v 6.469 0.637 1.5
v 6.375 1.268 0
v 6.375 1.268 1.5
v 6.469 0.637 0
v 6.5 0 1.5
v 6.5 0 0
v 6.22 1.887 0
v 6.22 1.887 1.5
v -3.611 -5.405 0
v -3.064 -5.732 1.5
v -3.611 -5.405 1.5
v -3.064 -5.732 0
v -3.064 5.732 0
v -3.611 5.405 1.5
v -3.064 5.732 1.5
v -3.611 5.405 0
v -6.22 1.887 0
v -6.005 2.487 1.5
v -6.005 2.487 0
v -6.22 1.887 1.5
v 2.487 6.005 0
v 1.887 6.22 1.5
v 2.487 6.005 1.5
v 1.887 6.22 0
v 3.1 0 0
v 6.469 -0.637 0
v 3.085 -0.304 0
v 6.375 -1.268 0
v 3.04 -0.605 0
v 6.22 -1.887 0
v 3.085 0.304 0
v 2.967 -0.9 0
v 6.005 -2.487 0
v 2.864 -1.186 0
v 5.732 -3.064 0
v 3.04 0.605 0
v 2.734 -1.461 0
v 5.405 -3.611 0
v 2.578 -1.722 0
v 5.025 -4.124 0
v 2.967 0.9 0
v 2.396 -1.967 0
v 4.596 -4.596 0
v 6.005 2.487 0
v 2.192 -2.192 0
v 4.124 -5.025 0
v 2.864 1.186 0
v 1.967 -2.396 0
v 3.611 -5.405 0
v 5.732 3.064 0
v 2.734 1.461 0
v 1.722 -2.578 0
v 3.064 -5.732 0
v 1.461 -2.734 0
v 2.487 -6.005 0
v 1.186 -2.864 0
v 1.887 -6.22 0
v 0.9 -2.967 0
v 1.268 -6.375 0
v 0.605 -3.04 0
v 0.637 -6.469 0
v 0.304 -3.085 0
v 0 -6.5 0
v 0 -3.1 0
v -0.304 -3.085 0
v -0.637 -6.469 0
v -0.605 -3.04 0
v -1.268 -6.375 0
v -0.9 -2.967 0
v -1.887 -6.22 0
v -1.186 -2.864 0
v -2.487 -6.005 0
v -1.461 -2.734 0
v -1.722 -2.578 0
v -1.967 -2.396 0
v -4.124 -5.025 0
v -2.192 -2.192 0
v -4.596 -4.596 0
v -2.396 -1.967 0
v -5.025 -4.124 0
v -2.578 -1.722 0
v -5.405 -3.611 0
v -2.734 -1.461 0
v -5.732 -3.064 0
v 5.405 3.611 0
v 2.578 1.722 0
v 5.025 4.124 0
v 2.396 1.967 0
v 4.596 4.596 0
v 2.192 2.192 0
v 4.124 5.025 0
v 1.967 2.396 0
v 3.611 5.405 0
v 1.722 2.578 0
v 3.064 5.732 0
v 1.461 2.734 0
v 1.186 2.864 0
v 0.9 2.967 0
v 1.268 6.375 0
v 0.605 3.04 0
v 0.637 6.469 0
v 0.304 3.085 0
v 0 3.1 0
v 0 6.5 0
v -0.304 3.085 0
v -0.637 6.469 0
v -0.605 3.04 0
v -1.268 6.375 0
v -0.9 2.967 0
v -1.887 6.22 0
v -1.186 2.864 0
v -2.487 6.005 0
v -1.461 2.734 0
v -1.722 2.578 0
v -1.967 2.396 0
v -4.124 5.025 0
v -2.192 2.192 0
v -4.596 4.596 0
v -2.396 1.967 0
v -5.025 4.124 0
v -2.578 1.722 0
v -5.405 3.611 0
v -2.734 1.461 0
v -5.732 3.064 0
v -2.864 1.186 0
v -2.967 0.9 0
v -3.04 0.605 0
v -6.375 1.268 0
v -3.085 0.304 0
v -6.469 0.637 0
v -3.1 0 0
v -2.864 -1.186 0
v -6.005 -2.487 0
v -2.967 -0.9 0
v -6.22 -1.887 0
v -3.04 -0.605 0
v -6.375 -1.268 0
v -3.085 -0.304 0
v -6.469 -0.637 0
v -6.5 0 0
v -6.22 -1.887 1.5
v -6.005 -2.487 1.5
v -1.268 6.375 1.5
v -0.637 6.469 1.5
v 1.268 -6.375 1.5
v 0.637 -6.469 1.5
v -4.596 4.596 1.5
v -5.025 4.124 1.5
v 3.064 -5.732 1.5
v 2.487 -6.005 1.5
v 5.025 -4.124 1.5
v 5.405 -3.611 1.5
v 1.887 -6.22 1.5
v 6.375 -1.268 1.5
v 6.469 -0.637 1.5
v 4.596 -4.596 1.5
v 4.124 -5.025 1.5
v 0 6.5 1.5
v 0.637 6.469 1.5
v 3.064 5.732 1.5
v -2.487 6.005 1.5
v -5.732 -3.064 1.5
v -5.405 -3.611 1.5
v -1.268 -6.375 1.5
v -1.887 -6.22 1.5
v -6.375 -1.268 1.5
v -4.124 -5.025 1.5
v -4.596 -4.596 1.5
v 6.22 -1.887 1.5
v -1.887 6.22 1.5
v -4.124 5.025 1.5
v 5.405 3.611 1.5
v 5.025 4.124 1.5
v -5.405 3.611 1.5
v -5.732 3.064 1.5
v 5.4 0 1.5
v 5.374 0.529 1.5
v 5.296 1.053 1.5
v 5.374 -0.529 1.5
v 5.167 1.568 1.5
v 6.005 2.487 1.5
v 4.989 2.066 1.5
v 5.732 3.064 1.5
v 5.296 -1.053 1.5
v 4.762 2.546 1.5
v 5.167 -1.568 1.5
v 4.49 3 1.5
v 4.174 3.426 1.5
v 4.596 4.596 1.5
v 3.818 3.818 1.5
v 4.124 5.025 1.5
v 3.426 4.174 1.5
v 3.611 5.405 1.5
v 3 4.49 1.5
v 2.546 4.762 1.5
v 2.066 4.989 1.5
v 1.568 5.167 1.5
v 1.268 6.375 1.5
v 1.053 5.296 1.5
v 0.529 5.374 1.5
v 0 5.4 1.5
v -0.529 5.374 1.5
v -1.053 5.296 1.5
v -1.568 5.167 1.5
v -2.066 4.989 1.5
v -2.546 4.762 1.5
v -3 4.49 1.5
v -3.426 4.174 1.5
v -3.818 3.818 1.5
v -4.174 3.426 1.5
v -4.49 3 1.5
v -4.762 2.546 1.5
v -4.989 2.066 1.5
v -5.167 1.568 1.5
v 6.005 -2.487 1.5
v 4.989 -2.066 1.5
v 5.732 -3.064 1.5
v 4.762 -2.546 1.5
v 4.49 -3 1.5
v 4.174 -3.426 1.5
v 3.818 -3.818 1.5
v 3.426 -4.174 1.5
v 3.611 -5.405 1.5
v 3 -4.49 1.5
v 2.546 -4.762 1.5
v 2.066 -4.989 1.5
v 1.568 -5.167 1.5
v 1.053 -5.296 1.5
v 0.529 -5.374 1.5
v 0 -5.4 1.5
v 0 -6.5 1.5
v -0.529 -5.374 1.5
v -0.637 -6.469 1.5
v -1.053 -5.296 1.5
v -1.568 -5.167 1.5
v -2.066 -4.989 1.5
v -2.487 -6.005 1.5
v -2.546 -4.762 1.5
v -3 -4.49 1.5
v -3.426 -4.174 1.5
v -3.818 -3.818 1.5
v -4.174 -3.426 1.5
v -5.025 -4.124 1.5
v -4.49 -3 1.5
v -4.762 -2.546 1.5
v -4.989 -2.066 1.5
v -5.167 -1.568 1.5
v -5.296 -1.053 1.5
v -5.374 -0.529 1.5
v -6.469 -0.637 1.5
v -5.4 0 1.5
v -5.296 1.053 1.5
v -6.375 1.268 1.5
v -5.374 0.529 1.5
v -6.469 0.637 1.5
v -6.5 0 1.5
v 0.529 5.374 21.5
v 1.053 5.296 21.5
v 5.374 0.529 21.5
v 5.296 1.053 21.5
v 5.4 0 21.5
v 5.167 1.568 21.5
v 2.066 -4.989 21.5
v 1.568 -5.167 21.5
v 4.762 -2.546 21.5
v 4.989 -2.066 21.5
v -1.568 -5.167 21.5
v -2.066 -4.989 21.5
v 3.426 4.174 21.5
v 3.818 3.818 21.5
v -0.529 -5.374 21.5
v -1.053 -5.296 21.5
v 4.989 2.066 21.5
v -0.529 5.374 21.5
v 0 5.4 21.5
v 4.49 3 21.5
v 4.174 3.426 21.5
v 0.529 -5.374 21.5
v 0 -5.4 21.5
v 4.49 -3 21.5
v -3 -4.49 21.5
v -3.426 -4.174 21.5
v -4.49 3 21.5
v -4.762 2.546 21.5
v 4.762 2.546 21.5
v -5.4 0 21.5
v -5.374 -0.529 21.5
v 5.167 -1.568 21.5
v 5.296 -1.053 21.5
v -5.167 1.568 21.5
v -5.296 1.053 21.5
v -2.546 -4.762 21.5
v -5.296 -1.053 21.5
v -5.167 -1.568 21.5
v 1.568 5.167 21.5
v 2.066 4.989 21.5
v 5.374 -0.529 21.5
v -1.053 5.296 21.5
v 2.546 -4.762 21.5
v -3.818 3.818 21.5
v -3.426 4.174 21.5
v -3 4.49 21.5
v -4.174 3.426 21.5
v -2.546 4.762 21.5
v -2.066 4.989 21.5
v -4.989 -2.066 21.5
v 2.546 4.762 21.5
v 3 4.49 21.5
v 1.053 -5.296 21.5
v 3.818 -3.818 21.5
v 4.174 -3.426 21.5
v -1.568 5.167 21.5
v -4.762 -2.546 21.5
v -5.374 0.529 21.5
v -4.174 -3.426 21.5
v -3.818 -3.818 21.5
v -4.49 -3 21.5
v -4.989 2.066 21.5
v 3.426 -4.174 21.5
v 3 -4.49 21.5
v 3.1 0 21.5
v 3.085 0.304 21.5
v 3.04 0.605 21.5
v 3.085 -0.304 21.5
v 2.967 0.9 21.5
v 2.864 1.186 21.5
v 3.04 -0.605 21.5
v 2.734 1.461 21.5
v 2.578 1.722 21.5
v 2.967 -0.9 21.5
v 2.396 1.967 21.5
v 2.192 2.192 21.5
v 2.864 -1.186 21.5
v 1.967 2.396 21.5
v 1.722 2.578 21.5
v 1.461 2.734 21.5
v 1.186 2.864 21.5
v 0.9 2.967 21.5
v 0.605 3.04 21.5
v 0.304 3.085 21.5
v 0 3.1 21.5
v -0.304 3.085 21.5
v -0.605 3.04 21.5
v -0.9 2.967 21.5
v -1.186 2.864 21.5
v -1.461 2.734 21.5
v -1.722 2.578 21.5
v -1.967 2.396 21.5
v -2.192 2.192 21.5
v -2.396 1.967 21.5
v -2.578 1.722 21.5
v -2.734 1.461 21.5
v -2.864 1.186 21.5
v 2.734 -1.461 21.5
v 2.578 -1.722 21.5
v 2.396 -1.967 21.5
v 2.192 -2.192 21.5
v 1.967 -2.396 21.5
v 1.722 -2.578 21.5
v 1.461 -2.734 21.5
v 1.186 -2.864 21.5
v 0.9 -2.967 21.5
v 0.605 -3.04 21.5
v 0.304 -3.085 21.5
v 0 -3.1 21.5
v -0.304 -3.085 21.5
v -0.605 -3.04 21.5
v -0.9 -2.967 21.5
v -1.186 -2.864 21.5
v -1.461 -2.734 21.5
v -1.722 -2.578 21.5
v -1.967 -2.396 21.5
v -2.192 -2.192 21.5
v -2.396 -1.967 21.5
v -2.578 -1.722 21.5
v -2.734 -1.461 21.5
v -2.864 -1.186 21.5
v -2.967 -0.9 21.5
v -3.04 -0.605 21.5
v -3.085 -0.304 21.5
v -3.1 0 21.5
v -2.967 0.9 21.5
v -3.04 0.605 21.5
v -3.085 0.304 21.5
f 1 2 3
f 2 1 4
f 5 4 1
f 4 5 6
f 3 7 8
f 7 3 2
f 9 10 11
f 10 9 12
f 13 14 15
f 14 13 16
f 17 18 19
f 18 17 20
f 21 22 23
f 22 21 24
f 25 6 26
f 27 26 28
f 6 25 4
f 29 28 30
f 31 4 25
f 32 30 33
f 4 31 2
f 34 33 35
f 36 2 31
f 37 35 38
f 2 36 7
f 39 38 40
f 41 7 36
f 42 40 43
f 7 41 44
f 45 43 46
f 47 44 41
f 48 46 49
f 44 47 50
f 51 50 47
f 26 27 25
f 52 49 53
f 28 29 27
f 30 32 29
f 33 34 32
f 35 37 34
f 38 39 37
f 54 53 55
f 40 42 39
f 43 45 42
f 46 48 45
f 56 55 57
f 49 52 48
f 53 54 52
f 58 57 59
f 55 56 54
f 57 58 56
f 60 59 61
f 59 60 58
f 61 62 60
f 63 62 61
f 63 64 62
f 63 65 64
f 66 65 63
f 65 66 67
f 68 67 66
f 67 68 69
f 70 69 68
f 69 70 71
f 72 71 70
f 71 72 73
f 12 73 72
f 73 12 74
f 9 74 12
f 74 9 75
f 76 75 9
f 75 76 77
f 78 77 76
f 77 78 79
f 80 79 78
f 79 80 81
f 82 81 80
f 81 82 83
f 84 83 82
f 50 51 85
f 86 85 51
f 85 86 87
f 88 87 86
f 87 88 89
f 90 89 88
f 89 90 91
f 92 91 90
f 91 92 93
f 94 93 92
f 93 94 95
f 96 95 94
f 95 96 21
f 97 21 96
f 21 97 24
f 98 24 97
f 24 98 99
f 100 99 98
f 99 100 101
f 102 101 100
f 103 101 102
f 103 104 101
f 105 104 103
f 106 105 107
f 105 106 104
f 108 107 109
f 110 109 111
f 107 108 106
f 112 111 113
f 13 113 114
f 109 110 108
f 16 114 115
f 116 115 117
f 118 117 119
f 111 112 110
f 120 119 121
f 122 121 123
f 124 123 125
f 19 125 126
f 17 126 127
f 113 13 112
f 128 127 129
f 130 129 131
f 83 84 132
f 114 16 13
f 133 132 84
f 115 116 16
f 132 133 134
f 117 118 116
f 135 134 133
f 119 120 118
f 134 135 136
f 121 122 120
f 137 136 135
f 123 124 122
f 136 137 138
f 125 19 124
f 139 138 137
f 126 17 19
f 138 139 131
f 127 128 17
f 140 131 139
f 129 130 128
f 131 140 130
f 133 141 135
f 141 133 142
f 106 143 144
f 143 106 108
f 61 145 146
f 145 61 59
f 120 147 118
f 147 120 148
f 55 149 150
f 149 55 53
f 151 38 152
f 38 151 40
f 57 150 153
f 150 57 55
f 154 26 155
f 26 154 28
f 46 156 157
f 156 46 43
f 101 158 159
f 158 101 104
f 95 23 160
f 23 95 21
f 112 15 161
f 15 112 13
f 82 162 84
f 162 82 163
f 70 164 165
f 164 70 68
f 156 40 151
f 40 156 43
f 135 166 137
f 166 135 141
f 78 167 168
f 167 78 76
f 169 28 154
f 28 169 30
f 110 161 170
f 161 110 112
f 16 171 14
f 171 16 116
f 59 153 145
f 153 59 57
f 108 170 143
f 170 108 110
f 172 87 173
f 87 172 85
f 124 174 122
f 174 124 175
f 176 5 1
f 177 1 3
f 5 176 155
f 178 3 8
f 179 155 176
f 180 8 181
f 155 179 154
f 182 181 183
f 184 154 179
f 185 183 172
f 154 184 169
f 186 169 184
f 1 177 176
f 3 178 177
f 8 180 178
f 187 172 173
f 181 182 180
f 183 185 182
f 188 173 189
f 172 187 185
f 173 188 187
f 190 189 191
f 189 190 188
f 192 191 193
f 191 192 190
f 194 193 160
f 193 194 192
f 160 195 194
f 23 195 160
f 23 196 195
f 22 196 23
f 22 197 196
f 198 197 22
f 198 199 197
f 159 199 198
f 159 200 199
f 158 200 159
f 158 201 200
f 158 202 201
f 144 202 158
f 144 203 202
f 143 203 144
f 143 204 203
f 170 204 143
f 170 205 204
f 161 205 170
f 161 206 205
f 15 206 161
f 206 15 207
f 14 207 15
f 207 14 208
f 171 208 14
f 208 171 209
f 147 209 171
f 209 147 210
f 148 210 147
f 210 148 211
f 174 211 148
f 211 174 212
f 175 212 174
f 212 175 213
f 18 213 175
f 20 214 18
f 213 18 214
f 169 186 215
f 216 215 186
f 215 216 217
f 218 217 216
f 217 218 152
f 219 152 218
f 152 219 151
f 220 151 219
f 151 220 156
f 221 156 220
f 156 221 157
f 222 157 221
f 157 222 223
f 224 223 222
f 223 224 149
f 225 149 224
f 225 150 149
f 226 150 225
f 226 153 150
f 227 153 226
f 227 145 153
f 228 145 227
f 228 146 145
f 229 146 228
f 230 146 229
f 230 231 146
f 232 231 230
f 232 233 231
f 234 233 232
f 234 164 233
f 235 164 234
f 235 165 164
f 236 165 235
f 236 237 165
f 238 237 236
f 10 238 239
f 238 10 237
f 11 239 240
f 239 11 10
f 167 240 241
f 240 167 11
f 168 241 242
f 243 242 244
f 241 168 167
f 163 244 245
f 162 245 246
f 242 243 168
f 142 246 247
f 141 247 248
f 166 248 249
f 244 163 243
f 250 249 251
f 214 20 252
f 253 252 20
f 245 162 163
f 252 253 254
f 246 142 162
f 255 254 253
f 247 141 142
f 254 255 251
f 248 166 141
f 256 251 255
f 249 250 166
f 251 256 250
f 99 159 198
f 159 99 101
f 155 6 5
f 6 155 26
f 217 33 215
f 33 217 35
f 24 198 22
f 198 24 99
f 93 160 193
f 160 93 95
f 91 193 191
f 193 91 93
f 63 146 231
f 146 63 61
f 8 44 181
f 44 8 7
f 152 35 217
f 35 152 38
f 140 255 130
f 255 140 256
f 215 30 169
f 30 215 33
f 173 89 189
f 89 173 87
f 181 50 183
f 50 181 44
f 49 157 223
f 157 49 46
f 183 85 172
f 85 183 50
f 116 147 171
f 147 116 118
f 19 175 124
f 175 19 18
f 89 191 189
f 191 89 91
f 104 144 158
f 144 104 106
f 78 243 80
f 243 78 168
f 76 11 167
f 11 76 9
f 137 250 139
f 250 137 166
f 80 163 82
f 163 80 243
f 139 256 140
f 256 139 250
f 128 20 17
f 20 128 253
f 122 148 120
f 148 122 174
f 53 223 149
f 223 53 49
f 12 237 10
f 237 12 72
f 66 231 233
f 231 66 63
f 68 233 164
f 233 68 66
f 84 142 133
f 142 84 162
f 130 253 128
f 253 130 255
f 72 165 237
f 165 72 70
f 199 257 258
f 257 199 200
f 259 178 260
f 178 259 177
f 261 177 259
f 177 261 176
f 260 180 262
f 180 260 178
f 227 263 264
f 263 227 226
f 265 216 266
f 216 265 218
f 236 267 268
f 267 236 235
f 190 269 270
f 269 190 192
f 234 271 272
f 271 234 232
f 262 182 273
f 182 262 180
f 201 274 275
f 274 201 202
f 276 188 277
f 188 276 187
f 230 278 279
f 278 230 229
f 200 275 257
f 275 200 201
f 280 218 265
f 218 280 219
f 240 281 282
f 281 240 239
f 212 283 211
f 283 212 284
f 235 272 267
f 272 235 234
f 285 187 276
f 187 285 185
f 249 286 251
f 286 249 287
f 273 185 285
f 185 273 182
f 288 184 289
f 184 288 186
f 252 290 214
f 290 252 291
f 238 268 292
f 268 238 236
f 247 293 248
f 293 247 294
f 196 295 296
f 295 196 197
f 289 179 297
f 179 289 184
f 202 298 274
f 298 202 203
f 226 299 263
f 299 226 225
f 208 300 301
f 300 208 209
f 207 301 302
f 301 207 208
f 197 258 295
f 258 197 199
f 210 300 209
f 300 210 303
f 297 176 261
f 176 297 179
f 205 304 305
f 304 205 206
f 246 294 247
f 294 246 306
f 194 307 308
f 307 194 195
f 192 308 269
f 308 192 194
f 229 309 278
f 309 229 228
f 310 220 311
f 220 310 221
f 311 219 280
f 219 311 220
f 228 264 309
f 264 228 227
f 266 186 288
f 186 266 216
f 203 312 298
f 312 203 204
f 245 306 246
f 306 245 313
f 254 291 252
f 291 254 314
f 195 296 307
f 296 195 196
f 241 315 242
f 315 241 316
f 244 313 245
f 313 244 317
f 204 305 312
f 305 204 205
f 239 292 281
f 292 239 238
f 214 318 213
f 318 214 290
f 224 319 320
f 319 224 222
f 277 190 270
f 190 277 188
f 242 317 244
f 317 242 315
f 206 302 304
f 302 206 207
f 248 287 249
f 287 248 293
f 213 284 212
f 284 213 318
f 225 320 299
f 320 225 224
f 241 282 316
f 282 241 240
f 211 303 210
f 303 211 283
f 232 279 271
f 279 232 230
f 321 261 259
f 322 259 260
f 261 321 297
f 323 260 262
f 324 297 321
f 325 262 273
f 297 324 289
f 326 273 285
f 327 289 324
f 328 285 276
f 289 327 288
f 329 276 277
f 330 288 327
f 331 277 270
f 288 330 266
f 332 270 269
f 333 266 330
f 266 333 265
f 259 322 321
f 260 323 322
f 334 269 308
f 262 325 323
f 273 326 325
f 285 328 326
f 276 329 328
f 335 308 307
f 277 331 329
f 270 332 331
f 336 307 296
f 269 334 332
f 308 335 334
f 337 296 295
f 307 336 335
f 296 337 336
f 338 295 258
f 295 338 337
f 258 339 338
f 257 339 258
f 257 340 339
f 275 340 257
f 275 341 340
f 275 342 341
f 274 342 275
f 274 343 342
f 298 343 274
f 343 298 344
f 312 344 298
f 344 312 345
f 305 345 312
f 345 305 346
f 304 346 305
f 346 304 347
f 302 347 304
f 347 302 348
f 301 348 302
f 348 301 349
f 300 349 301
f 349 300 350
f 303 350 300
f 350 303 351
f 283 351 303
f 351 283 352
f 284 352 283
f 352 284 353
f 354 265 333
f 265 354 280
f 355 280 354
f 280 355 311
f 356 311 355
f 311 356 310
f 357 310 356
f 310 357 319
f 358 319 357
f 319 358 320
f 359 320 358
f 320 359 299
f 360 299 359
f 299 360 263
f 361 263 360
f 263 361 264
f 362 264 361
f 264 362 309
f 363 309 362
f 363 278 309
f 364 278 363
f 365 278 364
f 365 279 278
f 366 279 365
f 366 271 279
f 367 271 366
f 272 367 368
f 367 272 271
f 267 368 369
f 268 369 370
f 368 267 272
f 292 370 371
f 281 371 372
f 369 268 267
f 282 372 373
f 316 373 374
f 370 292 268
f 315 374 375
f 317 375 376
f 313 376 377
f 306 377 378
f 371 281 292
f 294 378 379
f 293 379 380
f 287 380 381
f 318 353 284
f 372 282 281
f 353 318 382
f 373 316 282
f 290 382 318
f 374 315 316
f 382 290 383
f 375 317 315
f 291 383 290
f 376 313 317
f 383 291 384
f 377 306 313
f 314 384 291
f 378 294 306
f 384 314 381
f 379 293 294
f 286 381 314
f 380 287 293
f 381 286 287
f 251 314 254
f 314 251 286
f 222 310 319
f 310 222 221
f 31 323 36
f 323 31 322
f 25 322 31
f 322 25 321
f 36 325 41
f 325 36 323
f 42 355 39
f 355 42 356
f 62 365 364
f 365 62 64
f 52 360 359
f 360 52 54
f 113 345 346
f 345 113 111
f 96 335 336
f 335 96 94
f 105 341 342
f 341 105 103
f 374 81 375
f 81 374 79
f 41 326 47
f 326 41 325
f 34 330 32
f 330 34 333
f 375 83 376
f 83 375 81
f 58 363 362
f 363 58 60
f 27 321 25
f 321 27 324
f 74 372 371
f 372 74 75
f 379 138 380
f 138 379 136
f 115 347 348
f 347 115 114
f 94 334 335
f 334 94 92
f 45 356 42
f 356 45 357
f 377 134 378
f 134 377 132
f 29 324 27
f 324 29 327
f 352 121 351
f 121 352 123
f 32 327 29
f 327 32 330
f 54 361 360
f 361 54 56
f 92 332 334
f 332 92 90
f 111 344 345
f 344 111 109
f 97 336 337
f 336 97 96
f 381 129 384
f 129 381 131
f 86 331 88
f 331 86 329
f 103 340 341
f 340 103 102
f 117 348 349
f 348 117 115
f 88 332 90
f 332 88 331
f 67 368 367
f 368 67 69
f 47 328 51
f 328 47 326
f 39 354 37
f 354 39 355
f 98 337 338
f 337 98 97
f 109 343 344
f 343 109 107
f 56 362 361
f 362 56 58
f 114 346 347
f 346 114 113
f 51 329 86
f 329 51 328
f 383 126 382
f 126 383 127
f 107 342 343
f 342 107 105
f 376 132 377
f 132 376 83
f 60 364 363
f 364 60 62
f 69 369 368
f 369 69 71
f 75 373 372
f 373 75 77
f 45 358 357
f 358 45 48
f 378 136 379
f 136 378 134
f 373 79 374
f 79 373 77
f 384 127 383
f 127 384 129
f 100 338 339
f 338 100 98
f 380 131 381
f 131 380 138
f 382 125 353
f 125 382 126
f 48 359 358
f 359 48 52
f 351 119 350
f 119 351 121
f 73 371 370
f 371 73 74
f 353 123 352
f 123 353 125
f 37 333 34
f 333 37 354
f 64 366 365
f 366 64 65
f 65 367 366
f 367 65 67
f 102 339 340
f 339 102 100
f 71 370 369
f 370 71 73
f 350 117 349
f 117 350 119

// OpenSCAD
// Adapter sleeve: 0.2 mL PCR tube for 1.5 mL rack hole
// Print orientation: collar on bed (z = 0), sleeve rises to z = 21.5

$fn = 64;

// --- Dimensions (mm) ---
collar_d      = 13;    // collar diameter
collar_h      = 1.5;   // collar thickness
sleeve_od     = 10.8;  // sleeve outer diameter
sleeve_h      = 20;    // sleeve body height (z = 1.5 to 21.5)
bore_d        = 6.2;   // through-bore diameter
eps           = 0.5;   // cutter overshoot

total_h = collar_h + sleeve_h; // 21.5

difference() {
    union() {
        // Collar
        cylinder(d = collar_d, h = collar_h);
        // Sleeve body
        translate([0, 0, collar_h])
            cylinder(d = sleeve_od, h = sleeve_h);
    }
    // Through bore
    translate([0, 0, -eps])
        cylinder(d = bore_d, h = total_h + 2 * eps);
}
